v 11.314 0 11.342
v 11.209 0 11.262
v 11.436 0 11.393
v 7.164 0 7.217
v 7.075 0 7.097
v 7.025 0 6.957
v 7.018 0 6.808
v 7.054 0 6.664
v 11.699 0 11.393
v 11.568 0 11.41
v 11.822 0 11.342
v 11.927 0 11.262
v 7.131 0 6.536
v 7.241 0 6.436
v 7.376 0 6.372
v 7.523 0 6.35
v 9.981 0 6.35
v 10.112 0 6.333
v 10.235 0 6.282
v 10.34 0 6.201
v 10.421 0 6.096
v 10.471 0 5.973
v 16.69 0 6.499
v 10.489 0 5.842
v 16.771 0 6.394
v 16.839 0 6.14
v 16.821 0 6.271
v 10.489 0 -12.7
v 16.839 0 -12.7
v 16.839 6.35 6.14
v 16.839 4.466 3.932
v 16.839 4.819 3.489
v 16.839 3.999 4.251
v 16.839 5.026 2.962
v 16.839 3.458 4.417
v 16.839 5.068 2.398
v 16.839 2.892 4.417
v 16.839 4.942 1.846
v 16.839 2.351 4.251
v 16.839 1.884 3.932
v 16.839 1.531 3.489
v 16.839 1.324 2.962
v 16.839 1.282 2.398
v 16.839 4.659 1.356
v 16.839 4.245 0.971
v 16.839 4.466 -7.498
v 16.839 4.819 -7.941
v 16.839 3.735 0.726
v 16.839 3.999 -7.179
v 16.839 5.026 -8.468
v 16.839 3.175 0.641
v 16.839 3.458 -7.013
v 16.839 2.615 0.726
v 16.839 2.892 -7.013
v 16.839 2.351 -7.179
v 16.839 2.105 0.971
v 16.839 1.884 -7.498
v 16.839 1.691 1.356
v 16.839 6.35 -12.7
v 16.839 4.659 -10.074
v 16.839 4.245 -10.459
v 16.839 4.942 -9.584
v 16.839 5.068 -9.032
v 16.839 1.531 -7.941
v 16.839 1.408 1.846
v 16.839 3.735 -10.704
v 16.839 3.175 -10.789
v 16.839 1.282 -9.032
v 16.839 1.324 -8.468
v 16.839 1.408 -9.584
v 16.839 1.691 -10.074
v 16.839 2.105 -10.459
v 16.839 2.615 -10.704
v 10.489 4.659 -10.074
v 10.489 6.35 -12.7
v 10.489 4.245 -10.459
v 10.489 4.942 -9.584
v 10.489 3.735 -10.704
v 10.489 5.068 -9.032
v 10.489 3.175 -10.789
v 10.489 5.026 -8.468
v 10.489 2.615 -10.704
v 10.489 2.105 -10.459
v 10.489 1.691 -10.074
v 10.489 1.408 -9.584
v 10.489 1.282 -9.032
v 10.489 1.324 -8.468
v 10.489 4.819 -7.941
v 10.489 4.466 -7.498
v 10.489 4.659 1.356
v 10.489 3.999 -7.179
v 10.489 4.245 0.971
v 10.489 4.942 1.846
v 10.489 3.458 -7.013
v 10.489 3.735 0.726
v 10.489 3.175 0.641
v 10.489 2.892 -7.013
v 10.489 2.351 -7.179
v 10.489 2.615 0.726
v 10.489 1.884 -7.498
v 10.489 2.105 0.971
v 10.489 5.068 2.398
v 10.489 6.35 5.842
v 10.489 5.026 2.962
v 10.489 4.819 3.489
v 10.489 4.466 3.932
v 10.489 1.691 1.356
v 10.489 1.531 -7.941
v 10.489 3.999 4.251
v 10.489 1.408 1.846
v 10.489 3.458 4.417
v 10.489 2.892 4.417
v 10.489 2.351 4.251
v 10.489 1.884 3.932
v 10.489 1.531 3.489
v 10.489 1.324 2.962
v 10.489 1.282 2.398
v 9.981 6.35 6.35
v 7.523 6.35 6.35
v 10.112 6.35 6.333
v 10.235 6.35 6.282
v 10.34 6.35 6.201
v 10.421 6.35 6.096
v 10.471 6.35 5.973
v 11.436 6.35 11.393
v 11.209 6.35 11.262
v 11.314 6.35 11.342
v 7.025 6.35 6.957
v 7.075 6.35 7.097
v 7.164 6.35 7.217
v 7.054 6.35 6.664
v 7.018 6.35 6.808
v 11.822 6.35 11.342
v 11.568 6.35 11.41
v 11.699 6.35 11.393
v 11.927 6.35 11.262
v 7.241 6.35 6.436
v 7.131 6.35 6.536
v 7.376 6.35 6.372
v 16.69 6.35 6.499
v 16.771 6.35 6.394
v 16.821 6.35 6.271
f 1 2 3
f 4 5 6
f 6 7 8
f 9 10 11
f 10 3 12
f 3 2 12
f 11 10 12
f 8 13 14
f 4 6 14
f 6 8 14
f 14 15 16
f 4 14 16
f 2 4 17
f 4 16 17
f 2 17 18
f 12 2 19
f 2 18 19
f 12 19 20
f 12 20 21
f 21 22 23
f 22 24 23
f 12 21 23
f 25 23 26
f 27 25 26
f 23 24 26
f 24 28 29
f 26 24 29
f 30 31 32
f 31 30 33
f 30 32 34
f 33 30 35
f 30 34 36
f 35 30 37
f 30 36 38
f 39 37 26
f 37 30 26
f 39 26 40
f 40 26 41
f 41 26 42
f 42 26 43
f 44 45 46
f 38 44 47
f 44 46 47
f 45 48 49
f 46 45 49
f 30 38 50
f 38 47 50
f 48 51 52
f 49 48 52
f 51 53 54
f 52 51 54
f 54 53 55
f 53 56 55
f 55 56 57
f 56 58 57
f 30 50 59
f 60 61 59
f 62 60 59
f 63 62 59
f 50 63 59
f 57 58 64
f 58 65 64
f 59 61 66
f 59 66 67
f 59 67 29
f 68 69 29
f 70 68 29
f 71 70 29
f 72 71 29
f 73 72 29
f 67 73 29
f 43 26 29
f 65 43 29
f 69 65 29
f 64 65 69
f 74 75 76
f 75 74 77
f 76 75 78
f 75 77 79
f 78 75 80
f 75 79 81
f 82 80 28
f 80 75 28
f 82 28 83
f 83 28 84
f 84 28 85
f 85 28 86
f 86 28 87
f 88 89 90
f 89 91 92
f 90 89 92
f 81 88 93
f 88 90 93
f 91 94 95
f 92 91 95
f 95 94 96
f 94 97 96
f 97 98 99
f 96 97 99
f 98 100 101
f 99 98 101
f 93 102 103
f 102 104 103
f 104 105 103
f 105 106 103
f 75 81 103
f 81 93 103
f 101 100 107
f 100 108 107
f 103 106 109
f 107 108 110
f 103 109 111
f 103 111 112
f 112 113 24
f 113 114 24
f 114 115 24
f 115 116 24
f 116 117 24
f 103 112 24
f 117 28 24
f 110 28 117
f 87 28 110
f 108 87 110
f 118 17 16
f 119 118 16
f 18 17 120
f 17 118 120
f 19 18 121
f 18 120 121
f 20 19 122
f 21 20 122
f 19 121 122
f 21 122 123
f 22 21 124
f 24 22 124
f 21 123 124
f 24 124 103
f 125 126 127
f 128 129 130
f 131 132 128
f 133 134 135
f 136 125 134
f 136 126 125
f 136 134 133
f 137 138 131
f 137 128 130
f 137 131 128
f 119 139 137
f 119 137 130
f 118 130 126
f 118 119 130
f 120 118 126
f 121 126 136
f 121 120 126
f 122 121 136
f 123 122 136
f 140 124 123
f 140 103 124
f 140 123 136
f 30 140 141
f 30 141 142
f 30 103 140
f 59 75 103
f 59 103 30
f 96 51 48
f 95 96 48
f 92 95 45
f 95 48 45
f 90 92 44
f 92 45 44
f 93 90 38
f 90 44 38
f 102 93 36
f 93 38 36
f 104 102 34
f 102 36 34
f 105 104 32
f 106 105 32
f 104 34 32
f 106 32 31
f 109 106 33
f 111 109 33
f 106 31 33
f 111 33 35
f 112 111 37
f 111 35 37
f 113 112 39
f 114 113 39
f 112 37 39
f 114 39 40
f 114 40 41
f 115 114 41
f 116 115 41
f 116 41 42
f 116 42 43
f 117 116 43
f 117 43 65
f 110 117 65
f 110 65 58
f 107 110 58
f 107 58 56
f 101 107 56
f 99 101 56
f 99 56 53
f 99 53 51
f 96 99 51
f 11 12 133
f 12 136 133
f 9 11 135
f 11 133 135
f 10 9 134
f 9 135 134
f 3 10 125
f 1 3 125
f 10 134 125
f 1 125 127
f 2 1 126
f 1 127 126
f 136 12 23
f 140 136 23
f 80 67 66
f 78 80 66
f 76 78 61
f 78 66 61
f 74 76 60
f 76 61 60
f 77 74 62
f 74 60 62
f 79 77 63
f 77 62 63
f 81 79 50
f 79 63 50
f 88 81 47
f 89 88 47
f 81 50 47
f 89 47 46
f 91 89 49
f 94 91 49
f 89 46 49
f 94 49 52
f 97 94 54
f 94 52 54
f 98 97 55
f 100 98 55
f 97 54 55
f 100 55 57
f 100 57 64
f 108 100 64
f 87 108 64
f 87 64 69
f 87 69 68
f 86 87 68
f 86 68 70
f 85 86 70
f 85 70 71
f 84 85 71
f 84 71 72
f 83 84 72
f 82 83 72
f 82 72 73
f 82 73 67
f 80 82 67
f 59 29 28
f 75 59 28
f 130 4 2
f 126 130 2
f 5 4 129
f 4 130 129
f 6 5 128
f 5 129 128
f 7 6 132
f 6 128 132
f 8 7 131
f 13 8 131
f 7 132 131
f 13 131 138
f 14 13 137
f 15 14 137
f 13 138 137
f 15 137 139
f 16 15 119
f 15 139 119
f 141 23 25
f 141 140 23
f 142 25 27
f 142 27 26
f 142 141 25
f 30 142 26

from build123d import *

# Parameters (mm, degrees)
BOSS_EXTRUDE1_DEPTH       = 6.35
F_6_CLEARANCE_HOLE1_D     = 3.7973
F_6_CLEARANCE_HOLE1_DEPTH = 6.733175986
F_6_CLEARANCE_HOLE1_TIP   = 1.140824014
FILLET1_R                 = 0.508


with BuildPart() as part:
    # Sketch1 → Boss-Extrude1 (new body)
    with BuildSketch(Plane(origin=(0, 0, 0), x_dir=(1, 0, 0), z_dir=(0, 1, 0))):
        Polygon((11.567845271, -11.620817646), (16.838662917, -6.35), (16.838662917, 12.7), (10.488662917, 12.7), (10.488662917, -6.35), (6.297027625, -6.35), align=None)
    extrude(amount=BOSS_EXTRUDE1_DEPTH)

    # #6 Clearance Hole1
    with Locations(Plane.ZY.offset(-10.488662917)):
        with Locations((-8.89, 3.175), (2.54, 3.175)):
            Hole(F_6_CLEARANCE_HOLE1_D / 2, depth=F_6_CLEARANCE_HOLE1_DEPTH)
            with Locations((0, 0, -(F_6_CLEARANCE_HOLE1_DEPTH + F_6_CLEARANCE_HOLE1_TIP / 2))):  # 118° drill point
                Cone(0, F_6_CLEARANCE_HOLE1_D / 2, F_6_CLEARANCE_HOLE1_TIP, mode=Mode.SUBTRACT)

    # Fillet1
    fillet1_edges = [part.edges().sort_by_distance(p)[0] for p in [
        (6.297027625, 3.175, 6.35),
        (10.488662917, 3.175, 6.35),
        (16.838662917, 3.175, 6.35),
        (11.567845271, 3.175, 11.620817646),
    ]]
    fillet(fillet1_edges, radius=FILLET1_R)


solid = part.part
